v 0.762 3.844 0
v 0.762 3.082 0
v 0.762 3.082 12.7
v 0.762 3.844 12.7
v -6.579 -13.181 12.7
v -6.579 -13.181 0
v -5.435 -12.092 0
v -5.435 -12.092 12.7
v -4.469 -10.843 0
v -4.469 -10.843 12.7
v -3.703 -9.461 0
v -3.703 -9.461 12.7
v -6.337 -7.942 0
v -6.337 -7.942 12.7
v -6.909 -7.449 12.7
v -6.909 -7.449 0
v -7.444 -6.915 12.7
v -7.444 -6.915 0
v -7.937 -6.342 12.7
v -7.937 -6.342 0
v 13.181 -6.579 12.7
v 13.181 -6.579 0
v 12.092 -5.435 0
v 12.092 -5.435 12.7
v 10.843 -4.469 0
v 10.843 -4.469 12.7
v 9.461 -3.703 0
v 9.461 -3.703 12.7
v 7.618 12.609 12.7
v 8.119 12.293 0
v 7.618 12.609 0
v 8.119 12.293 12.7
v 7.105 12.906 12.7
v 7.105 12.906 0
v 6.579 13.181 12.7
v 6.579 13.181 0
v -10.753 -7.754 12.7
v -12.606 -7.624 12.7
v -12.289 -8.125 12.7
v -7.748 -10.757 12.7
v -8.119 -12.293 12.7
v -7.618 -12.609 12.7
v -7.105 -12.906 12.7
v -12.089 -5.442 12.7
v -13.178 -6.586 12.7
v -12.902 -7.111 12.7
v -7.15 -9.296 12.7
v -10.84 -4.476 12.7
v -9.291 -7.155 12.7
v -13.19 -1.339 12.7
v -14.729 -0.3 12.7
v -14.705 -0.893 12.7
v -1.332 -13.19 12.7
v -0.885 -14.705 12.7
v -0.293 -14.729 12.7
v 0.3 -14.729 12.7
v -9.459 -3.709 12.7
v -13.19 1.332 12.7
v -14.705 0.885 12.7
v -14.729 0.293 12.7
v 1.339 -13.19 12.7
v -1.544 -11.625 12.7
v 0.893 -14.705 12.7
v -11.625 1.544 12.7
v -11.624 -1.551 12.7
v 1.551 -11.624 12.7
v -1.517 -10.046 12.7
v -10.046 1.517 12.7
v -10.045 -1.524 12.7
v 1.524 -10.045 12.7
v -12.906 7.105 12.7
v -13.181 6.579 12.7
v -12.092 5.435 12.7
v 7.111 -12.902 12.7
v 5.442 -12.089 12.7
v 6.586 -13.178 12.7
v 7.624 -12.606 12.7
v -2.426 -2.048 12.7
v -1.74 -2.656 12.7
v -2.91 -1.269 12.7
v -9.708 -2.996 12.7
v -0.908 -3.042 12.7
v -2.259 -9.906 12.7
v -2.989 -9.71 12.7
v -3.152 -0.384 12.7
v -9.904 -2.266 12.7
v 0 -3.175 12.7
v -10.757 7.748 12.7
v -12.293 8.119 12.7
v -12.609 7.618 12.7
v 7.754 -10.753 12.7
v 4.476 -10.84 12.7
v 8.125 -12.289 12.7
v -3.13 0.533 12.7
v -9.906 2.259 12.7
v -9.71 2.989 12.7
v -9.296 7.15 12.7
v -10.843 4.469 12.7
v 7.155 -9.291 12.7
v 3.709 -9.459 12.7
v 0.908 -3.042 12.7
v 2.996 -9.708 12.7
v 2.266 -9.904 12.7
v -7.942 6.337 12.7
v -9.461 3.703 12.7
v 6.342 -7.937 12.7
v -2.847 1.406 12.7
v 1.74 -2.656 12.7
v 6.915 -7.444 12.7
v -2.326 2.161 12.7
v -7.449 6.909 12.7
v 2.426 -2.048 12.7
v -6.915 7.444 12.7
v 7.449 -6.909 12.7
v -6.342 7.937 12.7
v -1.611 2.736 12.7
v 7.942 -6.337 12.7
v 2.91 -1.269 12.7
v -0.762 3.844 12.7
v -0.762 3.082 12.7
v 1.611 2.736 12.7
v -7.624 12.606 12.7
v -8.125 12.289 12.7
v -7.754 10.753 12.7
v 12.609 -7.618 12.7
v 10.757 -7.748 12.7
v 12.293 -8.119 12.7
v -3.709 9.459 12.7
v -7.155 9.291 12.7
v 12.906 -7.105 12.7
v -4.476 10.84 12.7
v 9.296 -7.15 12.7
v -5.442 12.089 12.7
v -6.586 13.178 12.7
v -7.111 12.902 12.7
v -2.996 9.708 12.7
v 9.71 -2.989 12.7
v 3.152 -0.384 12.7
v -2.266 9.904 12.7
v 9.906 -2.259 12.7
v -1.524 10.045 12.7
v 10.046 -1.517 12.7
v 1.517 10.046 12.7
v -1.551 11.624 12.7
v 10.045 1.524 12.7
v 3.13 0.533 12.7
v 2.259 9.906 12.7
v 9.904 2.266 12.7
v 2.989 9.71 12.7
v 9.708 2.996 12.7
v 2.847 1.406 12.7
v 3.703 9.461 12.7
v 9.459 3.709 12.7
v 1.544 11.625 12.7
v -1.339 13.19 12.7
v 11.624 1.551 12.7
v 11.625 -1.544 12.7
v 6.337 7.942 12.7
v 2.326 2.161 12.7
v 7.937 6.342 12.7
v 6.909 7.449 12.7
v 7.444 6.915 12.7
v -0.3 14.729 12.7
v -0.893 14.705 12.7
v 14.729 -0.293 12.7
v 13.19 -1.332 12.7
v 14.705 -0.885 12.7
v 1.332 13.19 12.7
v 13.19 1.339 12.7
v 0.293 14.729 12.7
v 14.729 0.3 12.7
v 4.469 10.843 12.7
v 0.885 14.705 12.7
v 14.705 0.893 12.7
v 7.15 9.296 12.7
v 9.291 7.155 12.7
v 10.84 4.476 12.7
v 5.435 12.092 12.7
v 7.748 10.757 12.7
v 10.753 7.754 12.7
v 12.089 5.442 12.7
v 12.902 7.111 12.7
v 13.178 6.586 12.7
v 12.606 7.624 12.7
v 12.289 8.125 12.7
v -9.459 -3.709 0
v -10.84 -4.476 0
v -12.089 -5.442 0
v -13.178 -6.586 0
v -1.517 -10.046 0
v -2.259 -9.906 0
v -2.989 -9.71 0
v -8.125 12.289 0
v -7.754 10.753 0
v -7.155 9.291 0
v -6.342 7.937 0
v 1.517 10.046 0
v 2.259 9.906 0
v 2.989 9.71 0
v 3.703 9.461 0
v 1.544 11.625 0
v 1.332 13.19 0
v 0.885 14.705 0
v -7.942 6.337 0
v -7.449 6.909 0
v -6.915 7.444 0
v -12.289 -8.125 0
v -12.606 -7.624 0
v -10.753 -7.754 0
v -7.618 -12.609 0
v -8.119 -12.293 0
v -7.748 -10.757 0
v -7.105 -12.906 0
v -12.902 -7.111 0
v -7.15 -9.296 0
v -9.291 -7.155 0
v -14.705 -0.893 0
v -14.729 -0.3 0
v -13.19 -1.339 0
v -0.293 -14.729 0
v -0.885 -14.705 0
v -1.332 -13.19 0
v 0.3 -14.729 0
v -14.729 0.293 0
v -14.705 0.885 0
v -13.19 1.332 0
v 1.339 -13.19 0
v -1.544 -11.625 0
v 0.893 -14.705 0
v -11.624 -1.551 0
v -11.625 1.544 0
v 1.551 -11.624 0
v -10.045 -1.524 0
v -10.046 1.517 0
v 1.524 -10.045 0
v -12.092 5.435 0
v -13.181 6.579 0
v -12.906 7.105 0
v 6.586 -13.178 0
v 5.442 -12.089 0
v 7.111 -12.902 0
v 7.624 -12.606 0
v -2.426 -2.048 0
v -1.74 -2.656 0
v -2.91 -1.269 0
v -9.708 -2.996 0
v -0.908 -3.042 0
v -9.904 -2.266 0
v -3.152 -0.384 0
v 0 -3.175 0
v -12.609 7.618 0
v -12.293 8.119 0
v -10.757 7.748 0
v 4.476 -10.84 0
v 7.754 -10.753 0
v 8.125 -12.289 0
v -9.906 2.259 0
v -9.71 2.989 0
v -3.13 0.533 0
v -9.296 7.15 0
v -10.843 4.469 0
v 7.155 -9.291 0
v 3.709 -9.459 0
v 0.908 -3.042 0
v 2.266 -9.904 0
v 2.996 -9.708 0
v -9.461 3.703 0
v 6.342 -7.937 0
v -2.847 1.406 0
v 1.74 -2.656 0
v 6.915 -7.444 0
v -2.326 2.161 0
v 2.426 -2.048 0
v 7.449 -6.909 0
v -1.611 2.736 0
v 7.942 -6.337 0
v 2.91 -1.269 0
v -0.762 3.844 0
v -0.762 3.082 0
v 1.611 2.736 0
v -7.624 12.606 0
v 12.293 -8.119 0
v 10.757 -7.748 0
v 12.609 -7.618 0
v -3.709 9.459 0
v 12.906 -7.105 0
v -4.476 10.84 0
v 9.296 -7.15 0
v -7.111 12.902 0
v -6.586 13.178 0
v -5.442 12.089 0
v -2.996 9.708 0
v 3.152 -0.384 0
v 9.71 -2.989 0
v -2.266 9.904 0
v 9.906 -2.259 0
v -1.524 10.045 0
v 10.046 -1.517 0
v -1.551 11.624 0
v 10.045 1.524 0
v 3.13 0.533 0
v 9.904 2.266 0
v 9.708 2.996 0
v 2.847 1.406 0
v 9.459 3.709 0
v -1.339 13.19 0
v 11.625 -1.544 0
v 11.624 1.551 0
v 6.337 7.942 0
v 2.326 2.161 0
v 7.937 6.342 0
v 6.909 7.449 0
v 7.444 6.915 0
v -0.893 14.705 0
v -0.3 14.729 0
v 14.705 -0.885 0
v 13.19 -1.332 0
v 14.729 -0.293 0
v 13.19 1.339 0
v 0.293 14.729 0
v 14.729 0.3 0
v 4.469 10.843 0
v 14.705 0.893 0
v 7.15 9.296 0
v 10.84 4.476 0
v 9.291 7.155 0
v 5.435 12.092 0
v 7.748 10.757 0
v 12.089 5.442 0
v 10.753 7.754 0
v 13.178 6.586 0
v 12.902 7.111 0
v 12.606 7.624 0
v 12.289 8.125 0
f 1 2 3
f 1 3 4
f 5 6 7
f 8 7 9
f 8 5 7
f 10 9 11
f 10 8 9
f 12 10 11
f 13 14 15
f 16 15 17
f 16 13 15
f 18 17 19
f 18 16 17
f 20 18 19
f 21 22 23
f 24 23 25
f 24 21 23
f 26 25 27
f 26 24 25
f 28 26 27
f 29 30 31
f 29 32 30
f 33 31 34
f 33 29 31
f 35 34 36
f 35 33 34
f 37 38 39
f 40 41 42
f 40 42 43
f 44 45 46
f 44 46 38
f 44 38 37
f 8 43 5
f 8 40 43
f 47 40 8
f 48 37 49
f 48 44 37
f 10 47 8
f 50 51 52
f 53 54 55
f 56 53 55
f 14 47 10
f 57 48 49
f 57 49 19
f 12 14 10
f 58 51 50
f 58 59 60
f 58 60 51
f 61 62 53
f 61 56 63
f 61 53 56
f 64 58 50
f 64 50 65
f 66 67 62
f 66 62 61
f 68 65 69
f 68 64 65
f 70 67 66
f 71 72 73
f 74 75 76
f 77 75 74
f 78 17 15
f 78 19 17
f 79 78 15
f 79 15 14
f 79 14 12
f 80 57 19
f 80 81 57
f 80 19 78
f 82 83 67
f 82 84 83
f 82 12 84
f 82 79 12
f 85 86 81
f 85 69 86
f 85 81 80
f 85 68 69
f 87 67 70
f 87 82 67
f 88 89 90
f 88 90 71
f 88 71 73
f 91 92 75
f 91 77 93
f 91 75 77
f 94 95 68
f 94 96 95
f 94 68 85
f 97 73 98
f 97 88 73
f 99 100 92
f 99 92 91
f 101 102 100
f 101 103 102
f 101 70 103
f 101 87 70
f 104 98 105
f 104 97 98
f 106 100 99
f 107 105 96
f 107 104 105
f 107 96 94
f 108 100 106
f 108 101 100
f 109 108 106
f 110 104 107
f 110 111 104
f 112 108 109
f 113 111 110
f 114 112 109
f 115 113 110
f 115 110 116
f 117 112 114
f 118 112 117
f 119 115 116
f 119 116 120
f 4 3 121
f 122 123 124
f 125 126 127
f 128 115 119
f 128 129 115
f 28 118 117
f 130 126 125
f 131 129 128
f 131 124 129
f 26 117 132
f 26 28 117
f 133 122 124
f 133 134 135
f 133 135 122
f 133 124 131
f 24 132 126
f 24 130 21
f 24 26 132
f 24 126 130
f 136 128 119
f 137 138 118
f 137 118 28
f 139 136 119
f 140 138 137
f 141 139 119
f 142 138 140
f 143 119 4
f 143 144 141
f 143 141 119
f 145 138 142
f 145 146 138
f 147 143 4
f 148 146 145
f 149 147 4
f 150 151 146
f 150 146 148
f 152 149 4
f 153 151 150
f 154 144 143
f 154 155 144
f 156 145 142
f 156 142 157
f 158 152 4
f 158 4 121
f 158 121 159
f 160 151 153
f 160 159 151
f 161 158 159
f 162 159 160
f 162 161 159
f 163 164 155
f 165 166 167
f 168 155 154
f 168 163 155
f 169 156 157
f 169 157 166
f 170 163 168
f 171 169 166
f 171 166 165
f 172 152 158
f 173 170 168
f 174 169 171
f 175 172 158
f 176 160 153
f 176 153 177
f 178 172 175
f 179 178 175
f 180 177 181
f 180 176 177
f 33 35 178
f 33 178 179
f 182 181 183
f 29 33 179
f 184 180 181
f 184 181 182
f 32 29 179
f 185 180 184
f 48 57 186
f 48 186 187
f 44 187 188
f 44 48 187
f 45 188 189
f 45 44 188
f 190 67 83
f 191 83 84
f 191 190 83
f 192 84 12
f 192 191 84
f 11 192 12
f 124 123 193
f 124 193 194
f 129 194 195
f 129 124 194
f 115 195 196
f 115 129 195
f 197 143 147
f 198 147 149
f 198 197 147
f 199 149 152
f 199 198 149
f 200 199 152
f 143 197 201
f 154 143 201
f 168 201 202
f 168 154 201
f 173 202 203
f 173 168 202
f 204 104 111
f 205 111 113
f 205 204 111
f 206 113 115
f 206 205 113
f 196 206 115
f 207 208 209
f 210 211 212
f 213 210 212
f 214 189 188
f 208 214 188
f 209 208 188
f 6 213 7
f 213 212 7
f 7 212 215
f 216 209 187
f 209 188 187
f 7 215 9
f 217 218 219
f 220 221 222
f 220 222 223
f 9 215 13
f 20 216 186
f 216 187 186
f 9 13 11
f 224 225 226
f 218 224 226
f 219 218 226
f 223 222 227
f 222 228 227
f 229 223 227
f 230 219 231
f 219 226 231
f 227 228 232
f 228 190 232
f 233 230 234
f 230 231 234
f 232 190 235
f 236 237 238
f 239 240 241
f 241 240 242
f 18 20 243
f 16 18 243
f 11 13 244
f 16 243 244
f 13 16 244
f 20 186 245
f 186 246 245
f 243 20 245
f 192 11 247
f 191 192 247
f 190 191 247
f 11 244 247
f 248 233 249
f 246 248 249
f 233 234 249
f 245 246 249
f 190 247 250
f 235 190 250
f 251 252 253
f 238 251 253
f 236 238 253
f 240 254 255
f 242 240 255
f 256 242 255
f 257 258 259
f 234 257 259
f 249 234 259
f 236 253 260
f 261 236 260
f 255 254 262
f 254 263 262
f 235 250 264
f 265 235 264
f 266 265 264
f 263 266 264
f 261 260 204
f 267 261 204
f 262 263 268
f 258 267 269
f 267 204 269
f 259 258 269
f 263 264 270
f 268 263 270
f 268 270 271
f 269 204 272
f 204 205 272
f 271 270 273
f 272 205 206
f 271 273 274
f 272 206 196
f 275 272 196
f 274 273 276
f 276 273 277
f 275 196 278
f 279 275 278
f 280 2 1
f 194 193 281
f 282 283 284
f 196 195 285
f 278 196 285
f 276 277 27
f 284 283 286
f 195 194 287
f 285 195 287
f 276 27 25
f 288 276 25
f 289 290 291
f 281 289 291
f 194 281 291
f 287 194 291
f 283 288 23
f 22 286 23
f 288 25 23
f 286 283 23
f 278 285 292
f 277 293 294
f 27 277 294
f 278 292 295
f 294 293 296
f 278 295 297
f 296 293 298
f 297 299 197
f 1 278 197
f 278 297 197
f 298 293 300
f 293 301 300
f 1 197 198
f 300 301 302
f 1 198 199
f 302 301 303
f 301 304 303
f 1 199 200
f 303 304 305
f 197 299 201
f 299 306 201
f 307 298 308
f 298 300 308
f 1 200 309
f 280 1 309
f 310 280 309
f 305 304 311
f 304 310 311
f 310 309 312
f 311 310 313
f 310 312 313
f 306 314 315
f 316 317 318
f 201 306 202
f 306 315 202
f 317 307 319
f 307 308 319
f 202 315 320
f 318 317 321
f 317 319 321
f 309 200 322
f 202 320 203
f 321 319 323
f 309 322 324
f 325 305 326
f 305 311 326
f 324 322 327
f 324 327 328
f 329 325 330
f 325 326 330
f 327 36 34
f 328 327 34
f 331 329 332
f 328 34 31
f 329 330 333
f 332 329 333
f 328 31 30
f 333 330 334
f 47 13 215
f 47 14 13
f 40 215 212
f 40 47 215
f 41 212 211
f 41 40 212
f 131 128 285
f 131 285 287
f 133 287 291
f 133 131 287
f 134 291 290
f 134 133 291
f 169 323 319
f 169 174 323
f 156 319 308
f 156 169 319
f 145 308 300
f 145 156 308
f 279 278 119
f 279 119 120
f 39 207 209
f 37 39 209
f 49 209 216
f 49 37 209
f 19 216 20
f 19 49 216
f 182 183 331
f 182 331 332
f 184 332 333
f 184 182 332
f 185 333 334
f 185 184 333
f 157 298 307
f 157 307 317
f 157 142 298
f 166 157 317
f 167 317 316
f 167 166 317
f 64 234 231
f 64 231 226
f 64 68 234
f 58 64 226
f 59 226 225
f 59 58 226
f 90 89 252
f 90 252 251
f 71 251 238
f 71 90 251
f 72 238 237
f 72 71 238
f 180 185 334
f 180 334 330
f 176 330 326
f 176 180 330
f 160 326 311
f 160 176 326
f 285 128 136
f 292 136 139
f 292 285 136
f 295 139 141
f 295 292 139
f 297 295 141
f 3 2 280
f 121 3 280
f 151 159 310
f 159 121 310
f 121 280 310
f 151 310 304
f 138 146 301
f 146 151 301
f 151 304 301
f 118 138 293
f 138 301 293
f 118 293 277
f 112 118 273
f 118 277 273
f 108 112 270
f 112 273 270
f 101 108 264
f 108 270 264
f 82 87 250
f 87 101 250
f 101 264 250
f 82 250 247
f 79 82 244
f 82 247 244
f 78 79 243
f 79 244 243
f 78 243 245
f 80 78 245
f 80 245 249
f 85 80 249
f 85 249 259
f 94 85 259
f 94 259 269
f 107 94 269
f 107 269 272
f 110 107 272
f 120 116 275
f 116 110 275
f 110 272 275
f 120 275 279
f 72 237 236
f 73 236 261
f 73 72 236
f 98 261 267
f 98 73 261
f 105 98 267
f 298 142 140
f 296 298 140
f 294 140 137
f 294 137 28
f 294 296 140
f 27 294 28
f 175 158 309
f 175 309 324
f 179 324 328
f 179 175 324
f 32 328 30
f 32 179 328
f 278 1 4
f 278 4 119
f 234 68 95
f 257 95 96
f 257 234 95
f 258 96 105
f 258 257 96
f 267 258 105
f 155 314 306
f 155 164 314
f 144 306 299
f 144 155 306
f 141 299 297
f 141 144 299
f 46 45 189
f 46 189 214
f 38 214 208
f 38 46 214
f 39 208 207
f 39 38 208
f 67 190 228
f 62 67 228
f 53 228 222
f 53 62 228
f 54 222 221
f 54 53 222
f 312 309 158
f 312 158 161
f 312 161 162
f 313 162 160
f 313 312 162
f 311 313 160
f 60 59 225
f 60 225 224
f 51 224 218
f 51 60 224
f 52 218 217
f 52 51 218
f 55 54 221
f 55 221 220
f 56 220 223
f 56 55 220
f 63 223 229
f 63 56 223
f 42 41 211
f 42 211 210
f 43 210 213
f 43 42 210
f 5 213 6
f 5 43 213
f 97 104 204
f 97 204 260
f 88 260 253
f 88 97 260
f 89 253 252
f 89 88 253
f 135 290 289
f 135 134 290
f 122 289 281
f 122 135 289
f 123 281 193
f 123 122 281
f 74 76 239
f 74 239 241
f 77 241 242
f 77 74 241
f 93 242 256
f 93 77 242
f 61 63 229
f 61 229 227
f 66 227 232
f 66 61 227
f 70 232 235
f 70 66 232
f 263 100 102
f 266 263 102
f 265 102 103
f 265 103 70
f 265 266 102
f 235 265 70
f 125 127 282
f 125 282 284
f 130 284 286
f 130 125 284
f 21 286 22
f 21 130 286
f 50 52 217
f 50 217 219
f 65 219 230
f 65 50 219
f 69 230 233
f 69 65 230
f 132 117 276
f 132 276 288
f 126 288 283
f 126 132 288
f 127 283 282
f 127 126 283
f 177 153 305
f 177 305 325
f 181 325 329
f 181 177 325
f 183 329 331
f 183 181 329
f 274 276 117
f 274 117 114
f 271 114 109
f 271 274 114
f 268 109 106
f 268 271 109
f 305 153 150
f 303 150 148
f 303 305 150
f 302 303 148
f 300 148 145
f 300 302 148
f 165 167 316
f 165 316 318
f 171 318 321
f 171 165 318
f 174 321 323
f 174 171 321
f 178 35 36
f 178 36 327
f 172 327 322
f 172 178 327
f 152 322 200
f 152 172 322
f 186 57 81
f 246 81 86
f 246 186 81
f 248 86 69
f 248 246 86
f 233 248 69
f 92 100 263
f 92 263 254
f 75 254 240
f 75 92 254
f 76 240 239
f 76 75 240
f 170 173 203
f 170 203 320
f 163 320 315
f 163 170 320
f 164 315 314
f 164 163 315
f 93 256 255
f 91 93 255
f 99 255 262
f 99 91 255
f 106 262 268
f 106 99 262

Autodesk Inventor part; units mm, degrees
ref_plane "YZ Plane" through (0, 0, 0) normal (1, 0, 0) x (0, 1, 0)
ref_plane "XZ Plane" through (0, 0, 0) normal (0, 1, 0) x (-1, 0, 0)
ref_plane "XY Plane" through (0, 0, 0) normal (0, 0, 1) x (1, 0, 0)
sketch "Sketch1" plane through (0, 0, 0) normal (0, 0, 1) x (1, 0, 0)
  circle A0 centre (0, 0) radius 10.16
  arc A1 (-0.762, 3.0822) -> (0.762, 3.0822) centre (0, 0) ccw
  line L0 (0.762, 3.0822) -> (0.762, 3.8442)
  line L1 (0.762, 3.8442) -> (-0.762, 3.8442)
  line L2 (-0.762, 3.8442) -> (-0.762, 3.0822)
  point P0 (0, 3.0822)
extrude "Extrusion1" add sketch "Sketch1" along normal blind 12.7
sketch "Sketch2" plane through (0, 0, 12.7) normal (0, 0, 1) x (1, 0, 0)
  arc A0 (0.8854, 14.7054) -> (-0.8926, 14.7049) centre (0, 0) ccw
  arc A1 (-0.762, 3.0822) -> (0.762, 3.0822) centre (0, 0) ccw projected
  circle A2 centre (0, 0) radius 10.16 projected
  arc A3 (1.5168, 10.0461) -> (0.8854, 14.7054) centre (-8.8522, 11.0133) ccw
  arc A4 (-0.8926, 14.7049) -> (-1.524, 10.045) centre (8.8449, 11.0129) ccw
  dimension "d6" = 29.464
  dimension "d8" = 10.414
  dimension "d9" = 10.414
  dimension "d12" = 1.778
extrude "Extrusion2" add sketch "Sketch2" against normal blind 12.7 contours A3 A2 A4 A0
pattern_circular "Circular Pattern1" count 12 over 360 about axis through (0, 0, 0) along (0, 0, 1) of "Extrusion2"
properties part number "Gear" material "Stainless Steel"
